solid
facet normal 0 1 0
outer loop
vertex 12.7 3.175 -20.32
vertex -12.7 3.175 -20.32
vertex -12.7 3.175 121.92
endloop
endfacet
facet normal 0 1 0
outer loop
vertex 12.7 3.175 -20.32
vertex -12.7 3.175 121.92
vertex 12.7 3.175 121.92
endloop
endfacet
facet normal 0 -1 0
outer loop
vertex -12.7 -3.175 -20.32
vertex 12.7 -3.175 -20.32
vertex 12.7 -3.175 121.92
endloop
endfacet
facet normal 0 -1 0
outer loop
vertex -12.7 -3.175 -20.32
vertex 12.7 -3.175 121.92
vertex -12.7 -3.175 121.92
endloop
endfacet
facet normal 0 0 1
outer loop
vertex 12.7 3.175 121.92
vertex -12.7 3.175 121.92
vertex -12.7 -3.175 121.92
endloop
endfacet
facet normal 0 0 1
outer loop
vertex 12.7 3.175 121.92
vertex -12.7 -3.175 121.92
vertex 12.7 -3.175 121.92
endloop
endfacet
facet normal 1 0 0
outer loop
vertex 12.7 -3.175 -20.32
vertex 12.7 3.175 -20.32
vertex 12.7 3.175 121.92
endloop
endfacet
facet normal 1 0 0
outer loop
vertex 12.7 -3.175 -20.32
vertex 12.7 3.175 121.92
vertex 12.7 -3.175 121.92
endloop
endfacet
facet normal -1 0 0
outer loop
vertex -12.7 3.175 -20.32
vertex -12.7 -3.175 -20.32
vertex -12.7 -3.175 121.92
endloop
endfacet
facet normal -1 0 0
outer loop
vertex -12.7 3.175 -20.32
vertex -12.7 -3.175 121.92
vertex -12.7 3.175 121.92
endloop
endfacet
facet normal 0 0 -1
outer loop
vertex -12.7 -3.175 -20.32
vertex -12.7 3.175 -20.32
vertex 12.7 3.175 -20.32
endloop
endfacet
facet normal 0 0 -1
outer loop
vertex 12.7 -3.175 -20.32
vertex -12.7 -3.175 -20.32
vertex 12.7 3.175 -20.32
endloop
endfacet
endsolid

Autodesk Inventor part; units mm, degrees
ref_plane "Start plane" through (0, 0, -20.32) normal (0, 0, 1) x (1, 0, 0)
ref_plane "End plane" through (0, 0, 121.92) normal (0, 0, 1) x (1, 0, 0)
sketch "Sketch" plane through (0, 0, 0) normal (0, 0, 1) x (1, 0, 0)
  line L0 (12.7, -3.175) -> (-12.7, -3.175)
  line L1 (-12.7, -3.175) -> (-12.7, 3.175)
  line L2 (-12.7, 3.175) -> (12.7, 3.175)
  line L3 (12.7, 3.175) -> (12.7, -3.175)
  line L4 (-6, 0) -> (8, 0) construction
  line L5 (0, -30) -> (0, 40) construction
  line L6 (0, 54) -> (0, -44) construction
  line L7 (-17.78, 0) -> (17.78, 0) construction
  dimension "d0" = 6.35
  dimension "d1" = 25.4
  dimension "d4" = 12.7
  dimension "d5" = 3.175
extrude "Body" add sketch "Sketch" along normal up to surface (142.24 mm away) from surface at -20.32
sketch "Sketch3" plane through (0, 0, 0) normal (0, 0, 1) x (1, 0, 0)
  line L0 (0, 0) -> (10, 0)
ref_plane "Work Plane3" through (0, 0, 0) normal (0, -1, 0) x (1, 0, 0)
sketch "Sketch4" plane through (0, 0, 0) normal (0, -1, 0) x (1, 0, 0)
  line L0 (-2, -20.32) -> (12, -20.32)
  line L1 (-2, 121.92) -> (12, 121.92)
  dimension "d9" = 142.24
ref_plane "Work Plane4" through (0, -23.495, 121.92) normal (0, 0, 1) x (1, 0, 0)
split "Split1" plane through (0, -23.495, 121.92) removes the side toward (0, 0, 1)
ref_plane "Work Plane5" through (0, -146.5913, -20.32) normal (0, 0, -1) x (-1, 0, 0)
split "Split2" plane through (0, -146.5913, -20.32) removes the side toward (0, 0, -1)
equation "\"d0\" = G_W"
equation "\"d1\" = G_H"
equation "\"d4\" = 0.5 * d1"
equation "\"d5\" = 0.5 * d0"
equation "\"d2\" = G_L"
equation "\"G_W\" = 6.35"
equation "\"G_H\" = 25.4"
equation "\"G_L\" = d9"
equation "\"G_OFFSET_START\" = 20.32"
equation "\"G_OFFSET_END\" = 20.32"
equation "\"d6\" = -G_OFFSET_START"
equation "\"d7\" = G_OFFSET_END + B_L"
equation "\"B_L\" = 101.6"
properties part number "AISC - 1/4x1 - 5.6" material "Steel, Mild"
